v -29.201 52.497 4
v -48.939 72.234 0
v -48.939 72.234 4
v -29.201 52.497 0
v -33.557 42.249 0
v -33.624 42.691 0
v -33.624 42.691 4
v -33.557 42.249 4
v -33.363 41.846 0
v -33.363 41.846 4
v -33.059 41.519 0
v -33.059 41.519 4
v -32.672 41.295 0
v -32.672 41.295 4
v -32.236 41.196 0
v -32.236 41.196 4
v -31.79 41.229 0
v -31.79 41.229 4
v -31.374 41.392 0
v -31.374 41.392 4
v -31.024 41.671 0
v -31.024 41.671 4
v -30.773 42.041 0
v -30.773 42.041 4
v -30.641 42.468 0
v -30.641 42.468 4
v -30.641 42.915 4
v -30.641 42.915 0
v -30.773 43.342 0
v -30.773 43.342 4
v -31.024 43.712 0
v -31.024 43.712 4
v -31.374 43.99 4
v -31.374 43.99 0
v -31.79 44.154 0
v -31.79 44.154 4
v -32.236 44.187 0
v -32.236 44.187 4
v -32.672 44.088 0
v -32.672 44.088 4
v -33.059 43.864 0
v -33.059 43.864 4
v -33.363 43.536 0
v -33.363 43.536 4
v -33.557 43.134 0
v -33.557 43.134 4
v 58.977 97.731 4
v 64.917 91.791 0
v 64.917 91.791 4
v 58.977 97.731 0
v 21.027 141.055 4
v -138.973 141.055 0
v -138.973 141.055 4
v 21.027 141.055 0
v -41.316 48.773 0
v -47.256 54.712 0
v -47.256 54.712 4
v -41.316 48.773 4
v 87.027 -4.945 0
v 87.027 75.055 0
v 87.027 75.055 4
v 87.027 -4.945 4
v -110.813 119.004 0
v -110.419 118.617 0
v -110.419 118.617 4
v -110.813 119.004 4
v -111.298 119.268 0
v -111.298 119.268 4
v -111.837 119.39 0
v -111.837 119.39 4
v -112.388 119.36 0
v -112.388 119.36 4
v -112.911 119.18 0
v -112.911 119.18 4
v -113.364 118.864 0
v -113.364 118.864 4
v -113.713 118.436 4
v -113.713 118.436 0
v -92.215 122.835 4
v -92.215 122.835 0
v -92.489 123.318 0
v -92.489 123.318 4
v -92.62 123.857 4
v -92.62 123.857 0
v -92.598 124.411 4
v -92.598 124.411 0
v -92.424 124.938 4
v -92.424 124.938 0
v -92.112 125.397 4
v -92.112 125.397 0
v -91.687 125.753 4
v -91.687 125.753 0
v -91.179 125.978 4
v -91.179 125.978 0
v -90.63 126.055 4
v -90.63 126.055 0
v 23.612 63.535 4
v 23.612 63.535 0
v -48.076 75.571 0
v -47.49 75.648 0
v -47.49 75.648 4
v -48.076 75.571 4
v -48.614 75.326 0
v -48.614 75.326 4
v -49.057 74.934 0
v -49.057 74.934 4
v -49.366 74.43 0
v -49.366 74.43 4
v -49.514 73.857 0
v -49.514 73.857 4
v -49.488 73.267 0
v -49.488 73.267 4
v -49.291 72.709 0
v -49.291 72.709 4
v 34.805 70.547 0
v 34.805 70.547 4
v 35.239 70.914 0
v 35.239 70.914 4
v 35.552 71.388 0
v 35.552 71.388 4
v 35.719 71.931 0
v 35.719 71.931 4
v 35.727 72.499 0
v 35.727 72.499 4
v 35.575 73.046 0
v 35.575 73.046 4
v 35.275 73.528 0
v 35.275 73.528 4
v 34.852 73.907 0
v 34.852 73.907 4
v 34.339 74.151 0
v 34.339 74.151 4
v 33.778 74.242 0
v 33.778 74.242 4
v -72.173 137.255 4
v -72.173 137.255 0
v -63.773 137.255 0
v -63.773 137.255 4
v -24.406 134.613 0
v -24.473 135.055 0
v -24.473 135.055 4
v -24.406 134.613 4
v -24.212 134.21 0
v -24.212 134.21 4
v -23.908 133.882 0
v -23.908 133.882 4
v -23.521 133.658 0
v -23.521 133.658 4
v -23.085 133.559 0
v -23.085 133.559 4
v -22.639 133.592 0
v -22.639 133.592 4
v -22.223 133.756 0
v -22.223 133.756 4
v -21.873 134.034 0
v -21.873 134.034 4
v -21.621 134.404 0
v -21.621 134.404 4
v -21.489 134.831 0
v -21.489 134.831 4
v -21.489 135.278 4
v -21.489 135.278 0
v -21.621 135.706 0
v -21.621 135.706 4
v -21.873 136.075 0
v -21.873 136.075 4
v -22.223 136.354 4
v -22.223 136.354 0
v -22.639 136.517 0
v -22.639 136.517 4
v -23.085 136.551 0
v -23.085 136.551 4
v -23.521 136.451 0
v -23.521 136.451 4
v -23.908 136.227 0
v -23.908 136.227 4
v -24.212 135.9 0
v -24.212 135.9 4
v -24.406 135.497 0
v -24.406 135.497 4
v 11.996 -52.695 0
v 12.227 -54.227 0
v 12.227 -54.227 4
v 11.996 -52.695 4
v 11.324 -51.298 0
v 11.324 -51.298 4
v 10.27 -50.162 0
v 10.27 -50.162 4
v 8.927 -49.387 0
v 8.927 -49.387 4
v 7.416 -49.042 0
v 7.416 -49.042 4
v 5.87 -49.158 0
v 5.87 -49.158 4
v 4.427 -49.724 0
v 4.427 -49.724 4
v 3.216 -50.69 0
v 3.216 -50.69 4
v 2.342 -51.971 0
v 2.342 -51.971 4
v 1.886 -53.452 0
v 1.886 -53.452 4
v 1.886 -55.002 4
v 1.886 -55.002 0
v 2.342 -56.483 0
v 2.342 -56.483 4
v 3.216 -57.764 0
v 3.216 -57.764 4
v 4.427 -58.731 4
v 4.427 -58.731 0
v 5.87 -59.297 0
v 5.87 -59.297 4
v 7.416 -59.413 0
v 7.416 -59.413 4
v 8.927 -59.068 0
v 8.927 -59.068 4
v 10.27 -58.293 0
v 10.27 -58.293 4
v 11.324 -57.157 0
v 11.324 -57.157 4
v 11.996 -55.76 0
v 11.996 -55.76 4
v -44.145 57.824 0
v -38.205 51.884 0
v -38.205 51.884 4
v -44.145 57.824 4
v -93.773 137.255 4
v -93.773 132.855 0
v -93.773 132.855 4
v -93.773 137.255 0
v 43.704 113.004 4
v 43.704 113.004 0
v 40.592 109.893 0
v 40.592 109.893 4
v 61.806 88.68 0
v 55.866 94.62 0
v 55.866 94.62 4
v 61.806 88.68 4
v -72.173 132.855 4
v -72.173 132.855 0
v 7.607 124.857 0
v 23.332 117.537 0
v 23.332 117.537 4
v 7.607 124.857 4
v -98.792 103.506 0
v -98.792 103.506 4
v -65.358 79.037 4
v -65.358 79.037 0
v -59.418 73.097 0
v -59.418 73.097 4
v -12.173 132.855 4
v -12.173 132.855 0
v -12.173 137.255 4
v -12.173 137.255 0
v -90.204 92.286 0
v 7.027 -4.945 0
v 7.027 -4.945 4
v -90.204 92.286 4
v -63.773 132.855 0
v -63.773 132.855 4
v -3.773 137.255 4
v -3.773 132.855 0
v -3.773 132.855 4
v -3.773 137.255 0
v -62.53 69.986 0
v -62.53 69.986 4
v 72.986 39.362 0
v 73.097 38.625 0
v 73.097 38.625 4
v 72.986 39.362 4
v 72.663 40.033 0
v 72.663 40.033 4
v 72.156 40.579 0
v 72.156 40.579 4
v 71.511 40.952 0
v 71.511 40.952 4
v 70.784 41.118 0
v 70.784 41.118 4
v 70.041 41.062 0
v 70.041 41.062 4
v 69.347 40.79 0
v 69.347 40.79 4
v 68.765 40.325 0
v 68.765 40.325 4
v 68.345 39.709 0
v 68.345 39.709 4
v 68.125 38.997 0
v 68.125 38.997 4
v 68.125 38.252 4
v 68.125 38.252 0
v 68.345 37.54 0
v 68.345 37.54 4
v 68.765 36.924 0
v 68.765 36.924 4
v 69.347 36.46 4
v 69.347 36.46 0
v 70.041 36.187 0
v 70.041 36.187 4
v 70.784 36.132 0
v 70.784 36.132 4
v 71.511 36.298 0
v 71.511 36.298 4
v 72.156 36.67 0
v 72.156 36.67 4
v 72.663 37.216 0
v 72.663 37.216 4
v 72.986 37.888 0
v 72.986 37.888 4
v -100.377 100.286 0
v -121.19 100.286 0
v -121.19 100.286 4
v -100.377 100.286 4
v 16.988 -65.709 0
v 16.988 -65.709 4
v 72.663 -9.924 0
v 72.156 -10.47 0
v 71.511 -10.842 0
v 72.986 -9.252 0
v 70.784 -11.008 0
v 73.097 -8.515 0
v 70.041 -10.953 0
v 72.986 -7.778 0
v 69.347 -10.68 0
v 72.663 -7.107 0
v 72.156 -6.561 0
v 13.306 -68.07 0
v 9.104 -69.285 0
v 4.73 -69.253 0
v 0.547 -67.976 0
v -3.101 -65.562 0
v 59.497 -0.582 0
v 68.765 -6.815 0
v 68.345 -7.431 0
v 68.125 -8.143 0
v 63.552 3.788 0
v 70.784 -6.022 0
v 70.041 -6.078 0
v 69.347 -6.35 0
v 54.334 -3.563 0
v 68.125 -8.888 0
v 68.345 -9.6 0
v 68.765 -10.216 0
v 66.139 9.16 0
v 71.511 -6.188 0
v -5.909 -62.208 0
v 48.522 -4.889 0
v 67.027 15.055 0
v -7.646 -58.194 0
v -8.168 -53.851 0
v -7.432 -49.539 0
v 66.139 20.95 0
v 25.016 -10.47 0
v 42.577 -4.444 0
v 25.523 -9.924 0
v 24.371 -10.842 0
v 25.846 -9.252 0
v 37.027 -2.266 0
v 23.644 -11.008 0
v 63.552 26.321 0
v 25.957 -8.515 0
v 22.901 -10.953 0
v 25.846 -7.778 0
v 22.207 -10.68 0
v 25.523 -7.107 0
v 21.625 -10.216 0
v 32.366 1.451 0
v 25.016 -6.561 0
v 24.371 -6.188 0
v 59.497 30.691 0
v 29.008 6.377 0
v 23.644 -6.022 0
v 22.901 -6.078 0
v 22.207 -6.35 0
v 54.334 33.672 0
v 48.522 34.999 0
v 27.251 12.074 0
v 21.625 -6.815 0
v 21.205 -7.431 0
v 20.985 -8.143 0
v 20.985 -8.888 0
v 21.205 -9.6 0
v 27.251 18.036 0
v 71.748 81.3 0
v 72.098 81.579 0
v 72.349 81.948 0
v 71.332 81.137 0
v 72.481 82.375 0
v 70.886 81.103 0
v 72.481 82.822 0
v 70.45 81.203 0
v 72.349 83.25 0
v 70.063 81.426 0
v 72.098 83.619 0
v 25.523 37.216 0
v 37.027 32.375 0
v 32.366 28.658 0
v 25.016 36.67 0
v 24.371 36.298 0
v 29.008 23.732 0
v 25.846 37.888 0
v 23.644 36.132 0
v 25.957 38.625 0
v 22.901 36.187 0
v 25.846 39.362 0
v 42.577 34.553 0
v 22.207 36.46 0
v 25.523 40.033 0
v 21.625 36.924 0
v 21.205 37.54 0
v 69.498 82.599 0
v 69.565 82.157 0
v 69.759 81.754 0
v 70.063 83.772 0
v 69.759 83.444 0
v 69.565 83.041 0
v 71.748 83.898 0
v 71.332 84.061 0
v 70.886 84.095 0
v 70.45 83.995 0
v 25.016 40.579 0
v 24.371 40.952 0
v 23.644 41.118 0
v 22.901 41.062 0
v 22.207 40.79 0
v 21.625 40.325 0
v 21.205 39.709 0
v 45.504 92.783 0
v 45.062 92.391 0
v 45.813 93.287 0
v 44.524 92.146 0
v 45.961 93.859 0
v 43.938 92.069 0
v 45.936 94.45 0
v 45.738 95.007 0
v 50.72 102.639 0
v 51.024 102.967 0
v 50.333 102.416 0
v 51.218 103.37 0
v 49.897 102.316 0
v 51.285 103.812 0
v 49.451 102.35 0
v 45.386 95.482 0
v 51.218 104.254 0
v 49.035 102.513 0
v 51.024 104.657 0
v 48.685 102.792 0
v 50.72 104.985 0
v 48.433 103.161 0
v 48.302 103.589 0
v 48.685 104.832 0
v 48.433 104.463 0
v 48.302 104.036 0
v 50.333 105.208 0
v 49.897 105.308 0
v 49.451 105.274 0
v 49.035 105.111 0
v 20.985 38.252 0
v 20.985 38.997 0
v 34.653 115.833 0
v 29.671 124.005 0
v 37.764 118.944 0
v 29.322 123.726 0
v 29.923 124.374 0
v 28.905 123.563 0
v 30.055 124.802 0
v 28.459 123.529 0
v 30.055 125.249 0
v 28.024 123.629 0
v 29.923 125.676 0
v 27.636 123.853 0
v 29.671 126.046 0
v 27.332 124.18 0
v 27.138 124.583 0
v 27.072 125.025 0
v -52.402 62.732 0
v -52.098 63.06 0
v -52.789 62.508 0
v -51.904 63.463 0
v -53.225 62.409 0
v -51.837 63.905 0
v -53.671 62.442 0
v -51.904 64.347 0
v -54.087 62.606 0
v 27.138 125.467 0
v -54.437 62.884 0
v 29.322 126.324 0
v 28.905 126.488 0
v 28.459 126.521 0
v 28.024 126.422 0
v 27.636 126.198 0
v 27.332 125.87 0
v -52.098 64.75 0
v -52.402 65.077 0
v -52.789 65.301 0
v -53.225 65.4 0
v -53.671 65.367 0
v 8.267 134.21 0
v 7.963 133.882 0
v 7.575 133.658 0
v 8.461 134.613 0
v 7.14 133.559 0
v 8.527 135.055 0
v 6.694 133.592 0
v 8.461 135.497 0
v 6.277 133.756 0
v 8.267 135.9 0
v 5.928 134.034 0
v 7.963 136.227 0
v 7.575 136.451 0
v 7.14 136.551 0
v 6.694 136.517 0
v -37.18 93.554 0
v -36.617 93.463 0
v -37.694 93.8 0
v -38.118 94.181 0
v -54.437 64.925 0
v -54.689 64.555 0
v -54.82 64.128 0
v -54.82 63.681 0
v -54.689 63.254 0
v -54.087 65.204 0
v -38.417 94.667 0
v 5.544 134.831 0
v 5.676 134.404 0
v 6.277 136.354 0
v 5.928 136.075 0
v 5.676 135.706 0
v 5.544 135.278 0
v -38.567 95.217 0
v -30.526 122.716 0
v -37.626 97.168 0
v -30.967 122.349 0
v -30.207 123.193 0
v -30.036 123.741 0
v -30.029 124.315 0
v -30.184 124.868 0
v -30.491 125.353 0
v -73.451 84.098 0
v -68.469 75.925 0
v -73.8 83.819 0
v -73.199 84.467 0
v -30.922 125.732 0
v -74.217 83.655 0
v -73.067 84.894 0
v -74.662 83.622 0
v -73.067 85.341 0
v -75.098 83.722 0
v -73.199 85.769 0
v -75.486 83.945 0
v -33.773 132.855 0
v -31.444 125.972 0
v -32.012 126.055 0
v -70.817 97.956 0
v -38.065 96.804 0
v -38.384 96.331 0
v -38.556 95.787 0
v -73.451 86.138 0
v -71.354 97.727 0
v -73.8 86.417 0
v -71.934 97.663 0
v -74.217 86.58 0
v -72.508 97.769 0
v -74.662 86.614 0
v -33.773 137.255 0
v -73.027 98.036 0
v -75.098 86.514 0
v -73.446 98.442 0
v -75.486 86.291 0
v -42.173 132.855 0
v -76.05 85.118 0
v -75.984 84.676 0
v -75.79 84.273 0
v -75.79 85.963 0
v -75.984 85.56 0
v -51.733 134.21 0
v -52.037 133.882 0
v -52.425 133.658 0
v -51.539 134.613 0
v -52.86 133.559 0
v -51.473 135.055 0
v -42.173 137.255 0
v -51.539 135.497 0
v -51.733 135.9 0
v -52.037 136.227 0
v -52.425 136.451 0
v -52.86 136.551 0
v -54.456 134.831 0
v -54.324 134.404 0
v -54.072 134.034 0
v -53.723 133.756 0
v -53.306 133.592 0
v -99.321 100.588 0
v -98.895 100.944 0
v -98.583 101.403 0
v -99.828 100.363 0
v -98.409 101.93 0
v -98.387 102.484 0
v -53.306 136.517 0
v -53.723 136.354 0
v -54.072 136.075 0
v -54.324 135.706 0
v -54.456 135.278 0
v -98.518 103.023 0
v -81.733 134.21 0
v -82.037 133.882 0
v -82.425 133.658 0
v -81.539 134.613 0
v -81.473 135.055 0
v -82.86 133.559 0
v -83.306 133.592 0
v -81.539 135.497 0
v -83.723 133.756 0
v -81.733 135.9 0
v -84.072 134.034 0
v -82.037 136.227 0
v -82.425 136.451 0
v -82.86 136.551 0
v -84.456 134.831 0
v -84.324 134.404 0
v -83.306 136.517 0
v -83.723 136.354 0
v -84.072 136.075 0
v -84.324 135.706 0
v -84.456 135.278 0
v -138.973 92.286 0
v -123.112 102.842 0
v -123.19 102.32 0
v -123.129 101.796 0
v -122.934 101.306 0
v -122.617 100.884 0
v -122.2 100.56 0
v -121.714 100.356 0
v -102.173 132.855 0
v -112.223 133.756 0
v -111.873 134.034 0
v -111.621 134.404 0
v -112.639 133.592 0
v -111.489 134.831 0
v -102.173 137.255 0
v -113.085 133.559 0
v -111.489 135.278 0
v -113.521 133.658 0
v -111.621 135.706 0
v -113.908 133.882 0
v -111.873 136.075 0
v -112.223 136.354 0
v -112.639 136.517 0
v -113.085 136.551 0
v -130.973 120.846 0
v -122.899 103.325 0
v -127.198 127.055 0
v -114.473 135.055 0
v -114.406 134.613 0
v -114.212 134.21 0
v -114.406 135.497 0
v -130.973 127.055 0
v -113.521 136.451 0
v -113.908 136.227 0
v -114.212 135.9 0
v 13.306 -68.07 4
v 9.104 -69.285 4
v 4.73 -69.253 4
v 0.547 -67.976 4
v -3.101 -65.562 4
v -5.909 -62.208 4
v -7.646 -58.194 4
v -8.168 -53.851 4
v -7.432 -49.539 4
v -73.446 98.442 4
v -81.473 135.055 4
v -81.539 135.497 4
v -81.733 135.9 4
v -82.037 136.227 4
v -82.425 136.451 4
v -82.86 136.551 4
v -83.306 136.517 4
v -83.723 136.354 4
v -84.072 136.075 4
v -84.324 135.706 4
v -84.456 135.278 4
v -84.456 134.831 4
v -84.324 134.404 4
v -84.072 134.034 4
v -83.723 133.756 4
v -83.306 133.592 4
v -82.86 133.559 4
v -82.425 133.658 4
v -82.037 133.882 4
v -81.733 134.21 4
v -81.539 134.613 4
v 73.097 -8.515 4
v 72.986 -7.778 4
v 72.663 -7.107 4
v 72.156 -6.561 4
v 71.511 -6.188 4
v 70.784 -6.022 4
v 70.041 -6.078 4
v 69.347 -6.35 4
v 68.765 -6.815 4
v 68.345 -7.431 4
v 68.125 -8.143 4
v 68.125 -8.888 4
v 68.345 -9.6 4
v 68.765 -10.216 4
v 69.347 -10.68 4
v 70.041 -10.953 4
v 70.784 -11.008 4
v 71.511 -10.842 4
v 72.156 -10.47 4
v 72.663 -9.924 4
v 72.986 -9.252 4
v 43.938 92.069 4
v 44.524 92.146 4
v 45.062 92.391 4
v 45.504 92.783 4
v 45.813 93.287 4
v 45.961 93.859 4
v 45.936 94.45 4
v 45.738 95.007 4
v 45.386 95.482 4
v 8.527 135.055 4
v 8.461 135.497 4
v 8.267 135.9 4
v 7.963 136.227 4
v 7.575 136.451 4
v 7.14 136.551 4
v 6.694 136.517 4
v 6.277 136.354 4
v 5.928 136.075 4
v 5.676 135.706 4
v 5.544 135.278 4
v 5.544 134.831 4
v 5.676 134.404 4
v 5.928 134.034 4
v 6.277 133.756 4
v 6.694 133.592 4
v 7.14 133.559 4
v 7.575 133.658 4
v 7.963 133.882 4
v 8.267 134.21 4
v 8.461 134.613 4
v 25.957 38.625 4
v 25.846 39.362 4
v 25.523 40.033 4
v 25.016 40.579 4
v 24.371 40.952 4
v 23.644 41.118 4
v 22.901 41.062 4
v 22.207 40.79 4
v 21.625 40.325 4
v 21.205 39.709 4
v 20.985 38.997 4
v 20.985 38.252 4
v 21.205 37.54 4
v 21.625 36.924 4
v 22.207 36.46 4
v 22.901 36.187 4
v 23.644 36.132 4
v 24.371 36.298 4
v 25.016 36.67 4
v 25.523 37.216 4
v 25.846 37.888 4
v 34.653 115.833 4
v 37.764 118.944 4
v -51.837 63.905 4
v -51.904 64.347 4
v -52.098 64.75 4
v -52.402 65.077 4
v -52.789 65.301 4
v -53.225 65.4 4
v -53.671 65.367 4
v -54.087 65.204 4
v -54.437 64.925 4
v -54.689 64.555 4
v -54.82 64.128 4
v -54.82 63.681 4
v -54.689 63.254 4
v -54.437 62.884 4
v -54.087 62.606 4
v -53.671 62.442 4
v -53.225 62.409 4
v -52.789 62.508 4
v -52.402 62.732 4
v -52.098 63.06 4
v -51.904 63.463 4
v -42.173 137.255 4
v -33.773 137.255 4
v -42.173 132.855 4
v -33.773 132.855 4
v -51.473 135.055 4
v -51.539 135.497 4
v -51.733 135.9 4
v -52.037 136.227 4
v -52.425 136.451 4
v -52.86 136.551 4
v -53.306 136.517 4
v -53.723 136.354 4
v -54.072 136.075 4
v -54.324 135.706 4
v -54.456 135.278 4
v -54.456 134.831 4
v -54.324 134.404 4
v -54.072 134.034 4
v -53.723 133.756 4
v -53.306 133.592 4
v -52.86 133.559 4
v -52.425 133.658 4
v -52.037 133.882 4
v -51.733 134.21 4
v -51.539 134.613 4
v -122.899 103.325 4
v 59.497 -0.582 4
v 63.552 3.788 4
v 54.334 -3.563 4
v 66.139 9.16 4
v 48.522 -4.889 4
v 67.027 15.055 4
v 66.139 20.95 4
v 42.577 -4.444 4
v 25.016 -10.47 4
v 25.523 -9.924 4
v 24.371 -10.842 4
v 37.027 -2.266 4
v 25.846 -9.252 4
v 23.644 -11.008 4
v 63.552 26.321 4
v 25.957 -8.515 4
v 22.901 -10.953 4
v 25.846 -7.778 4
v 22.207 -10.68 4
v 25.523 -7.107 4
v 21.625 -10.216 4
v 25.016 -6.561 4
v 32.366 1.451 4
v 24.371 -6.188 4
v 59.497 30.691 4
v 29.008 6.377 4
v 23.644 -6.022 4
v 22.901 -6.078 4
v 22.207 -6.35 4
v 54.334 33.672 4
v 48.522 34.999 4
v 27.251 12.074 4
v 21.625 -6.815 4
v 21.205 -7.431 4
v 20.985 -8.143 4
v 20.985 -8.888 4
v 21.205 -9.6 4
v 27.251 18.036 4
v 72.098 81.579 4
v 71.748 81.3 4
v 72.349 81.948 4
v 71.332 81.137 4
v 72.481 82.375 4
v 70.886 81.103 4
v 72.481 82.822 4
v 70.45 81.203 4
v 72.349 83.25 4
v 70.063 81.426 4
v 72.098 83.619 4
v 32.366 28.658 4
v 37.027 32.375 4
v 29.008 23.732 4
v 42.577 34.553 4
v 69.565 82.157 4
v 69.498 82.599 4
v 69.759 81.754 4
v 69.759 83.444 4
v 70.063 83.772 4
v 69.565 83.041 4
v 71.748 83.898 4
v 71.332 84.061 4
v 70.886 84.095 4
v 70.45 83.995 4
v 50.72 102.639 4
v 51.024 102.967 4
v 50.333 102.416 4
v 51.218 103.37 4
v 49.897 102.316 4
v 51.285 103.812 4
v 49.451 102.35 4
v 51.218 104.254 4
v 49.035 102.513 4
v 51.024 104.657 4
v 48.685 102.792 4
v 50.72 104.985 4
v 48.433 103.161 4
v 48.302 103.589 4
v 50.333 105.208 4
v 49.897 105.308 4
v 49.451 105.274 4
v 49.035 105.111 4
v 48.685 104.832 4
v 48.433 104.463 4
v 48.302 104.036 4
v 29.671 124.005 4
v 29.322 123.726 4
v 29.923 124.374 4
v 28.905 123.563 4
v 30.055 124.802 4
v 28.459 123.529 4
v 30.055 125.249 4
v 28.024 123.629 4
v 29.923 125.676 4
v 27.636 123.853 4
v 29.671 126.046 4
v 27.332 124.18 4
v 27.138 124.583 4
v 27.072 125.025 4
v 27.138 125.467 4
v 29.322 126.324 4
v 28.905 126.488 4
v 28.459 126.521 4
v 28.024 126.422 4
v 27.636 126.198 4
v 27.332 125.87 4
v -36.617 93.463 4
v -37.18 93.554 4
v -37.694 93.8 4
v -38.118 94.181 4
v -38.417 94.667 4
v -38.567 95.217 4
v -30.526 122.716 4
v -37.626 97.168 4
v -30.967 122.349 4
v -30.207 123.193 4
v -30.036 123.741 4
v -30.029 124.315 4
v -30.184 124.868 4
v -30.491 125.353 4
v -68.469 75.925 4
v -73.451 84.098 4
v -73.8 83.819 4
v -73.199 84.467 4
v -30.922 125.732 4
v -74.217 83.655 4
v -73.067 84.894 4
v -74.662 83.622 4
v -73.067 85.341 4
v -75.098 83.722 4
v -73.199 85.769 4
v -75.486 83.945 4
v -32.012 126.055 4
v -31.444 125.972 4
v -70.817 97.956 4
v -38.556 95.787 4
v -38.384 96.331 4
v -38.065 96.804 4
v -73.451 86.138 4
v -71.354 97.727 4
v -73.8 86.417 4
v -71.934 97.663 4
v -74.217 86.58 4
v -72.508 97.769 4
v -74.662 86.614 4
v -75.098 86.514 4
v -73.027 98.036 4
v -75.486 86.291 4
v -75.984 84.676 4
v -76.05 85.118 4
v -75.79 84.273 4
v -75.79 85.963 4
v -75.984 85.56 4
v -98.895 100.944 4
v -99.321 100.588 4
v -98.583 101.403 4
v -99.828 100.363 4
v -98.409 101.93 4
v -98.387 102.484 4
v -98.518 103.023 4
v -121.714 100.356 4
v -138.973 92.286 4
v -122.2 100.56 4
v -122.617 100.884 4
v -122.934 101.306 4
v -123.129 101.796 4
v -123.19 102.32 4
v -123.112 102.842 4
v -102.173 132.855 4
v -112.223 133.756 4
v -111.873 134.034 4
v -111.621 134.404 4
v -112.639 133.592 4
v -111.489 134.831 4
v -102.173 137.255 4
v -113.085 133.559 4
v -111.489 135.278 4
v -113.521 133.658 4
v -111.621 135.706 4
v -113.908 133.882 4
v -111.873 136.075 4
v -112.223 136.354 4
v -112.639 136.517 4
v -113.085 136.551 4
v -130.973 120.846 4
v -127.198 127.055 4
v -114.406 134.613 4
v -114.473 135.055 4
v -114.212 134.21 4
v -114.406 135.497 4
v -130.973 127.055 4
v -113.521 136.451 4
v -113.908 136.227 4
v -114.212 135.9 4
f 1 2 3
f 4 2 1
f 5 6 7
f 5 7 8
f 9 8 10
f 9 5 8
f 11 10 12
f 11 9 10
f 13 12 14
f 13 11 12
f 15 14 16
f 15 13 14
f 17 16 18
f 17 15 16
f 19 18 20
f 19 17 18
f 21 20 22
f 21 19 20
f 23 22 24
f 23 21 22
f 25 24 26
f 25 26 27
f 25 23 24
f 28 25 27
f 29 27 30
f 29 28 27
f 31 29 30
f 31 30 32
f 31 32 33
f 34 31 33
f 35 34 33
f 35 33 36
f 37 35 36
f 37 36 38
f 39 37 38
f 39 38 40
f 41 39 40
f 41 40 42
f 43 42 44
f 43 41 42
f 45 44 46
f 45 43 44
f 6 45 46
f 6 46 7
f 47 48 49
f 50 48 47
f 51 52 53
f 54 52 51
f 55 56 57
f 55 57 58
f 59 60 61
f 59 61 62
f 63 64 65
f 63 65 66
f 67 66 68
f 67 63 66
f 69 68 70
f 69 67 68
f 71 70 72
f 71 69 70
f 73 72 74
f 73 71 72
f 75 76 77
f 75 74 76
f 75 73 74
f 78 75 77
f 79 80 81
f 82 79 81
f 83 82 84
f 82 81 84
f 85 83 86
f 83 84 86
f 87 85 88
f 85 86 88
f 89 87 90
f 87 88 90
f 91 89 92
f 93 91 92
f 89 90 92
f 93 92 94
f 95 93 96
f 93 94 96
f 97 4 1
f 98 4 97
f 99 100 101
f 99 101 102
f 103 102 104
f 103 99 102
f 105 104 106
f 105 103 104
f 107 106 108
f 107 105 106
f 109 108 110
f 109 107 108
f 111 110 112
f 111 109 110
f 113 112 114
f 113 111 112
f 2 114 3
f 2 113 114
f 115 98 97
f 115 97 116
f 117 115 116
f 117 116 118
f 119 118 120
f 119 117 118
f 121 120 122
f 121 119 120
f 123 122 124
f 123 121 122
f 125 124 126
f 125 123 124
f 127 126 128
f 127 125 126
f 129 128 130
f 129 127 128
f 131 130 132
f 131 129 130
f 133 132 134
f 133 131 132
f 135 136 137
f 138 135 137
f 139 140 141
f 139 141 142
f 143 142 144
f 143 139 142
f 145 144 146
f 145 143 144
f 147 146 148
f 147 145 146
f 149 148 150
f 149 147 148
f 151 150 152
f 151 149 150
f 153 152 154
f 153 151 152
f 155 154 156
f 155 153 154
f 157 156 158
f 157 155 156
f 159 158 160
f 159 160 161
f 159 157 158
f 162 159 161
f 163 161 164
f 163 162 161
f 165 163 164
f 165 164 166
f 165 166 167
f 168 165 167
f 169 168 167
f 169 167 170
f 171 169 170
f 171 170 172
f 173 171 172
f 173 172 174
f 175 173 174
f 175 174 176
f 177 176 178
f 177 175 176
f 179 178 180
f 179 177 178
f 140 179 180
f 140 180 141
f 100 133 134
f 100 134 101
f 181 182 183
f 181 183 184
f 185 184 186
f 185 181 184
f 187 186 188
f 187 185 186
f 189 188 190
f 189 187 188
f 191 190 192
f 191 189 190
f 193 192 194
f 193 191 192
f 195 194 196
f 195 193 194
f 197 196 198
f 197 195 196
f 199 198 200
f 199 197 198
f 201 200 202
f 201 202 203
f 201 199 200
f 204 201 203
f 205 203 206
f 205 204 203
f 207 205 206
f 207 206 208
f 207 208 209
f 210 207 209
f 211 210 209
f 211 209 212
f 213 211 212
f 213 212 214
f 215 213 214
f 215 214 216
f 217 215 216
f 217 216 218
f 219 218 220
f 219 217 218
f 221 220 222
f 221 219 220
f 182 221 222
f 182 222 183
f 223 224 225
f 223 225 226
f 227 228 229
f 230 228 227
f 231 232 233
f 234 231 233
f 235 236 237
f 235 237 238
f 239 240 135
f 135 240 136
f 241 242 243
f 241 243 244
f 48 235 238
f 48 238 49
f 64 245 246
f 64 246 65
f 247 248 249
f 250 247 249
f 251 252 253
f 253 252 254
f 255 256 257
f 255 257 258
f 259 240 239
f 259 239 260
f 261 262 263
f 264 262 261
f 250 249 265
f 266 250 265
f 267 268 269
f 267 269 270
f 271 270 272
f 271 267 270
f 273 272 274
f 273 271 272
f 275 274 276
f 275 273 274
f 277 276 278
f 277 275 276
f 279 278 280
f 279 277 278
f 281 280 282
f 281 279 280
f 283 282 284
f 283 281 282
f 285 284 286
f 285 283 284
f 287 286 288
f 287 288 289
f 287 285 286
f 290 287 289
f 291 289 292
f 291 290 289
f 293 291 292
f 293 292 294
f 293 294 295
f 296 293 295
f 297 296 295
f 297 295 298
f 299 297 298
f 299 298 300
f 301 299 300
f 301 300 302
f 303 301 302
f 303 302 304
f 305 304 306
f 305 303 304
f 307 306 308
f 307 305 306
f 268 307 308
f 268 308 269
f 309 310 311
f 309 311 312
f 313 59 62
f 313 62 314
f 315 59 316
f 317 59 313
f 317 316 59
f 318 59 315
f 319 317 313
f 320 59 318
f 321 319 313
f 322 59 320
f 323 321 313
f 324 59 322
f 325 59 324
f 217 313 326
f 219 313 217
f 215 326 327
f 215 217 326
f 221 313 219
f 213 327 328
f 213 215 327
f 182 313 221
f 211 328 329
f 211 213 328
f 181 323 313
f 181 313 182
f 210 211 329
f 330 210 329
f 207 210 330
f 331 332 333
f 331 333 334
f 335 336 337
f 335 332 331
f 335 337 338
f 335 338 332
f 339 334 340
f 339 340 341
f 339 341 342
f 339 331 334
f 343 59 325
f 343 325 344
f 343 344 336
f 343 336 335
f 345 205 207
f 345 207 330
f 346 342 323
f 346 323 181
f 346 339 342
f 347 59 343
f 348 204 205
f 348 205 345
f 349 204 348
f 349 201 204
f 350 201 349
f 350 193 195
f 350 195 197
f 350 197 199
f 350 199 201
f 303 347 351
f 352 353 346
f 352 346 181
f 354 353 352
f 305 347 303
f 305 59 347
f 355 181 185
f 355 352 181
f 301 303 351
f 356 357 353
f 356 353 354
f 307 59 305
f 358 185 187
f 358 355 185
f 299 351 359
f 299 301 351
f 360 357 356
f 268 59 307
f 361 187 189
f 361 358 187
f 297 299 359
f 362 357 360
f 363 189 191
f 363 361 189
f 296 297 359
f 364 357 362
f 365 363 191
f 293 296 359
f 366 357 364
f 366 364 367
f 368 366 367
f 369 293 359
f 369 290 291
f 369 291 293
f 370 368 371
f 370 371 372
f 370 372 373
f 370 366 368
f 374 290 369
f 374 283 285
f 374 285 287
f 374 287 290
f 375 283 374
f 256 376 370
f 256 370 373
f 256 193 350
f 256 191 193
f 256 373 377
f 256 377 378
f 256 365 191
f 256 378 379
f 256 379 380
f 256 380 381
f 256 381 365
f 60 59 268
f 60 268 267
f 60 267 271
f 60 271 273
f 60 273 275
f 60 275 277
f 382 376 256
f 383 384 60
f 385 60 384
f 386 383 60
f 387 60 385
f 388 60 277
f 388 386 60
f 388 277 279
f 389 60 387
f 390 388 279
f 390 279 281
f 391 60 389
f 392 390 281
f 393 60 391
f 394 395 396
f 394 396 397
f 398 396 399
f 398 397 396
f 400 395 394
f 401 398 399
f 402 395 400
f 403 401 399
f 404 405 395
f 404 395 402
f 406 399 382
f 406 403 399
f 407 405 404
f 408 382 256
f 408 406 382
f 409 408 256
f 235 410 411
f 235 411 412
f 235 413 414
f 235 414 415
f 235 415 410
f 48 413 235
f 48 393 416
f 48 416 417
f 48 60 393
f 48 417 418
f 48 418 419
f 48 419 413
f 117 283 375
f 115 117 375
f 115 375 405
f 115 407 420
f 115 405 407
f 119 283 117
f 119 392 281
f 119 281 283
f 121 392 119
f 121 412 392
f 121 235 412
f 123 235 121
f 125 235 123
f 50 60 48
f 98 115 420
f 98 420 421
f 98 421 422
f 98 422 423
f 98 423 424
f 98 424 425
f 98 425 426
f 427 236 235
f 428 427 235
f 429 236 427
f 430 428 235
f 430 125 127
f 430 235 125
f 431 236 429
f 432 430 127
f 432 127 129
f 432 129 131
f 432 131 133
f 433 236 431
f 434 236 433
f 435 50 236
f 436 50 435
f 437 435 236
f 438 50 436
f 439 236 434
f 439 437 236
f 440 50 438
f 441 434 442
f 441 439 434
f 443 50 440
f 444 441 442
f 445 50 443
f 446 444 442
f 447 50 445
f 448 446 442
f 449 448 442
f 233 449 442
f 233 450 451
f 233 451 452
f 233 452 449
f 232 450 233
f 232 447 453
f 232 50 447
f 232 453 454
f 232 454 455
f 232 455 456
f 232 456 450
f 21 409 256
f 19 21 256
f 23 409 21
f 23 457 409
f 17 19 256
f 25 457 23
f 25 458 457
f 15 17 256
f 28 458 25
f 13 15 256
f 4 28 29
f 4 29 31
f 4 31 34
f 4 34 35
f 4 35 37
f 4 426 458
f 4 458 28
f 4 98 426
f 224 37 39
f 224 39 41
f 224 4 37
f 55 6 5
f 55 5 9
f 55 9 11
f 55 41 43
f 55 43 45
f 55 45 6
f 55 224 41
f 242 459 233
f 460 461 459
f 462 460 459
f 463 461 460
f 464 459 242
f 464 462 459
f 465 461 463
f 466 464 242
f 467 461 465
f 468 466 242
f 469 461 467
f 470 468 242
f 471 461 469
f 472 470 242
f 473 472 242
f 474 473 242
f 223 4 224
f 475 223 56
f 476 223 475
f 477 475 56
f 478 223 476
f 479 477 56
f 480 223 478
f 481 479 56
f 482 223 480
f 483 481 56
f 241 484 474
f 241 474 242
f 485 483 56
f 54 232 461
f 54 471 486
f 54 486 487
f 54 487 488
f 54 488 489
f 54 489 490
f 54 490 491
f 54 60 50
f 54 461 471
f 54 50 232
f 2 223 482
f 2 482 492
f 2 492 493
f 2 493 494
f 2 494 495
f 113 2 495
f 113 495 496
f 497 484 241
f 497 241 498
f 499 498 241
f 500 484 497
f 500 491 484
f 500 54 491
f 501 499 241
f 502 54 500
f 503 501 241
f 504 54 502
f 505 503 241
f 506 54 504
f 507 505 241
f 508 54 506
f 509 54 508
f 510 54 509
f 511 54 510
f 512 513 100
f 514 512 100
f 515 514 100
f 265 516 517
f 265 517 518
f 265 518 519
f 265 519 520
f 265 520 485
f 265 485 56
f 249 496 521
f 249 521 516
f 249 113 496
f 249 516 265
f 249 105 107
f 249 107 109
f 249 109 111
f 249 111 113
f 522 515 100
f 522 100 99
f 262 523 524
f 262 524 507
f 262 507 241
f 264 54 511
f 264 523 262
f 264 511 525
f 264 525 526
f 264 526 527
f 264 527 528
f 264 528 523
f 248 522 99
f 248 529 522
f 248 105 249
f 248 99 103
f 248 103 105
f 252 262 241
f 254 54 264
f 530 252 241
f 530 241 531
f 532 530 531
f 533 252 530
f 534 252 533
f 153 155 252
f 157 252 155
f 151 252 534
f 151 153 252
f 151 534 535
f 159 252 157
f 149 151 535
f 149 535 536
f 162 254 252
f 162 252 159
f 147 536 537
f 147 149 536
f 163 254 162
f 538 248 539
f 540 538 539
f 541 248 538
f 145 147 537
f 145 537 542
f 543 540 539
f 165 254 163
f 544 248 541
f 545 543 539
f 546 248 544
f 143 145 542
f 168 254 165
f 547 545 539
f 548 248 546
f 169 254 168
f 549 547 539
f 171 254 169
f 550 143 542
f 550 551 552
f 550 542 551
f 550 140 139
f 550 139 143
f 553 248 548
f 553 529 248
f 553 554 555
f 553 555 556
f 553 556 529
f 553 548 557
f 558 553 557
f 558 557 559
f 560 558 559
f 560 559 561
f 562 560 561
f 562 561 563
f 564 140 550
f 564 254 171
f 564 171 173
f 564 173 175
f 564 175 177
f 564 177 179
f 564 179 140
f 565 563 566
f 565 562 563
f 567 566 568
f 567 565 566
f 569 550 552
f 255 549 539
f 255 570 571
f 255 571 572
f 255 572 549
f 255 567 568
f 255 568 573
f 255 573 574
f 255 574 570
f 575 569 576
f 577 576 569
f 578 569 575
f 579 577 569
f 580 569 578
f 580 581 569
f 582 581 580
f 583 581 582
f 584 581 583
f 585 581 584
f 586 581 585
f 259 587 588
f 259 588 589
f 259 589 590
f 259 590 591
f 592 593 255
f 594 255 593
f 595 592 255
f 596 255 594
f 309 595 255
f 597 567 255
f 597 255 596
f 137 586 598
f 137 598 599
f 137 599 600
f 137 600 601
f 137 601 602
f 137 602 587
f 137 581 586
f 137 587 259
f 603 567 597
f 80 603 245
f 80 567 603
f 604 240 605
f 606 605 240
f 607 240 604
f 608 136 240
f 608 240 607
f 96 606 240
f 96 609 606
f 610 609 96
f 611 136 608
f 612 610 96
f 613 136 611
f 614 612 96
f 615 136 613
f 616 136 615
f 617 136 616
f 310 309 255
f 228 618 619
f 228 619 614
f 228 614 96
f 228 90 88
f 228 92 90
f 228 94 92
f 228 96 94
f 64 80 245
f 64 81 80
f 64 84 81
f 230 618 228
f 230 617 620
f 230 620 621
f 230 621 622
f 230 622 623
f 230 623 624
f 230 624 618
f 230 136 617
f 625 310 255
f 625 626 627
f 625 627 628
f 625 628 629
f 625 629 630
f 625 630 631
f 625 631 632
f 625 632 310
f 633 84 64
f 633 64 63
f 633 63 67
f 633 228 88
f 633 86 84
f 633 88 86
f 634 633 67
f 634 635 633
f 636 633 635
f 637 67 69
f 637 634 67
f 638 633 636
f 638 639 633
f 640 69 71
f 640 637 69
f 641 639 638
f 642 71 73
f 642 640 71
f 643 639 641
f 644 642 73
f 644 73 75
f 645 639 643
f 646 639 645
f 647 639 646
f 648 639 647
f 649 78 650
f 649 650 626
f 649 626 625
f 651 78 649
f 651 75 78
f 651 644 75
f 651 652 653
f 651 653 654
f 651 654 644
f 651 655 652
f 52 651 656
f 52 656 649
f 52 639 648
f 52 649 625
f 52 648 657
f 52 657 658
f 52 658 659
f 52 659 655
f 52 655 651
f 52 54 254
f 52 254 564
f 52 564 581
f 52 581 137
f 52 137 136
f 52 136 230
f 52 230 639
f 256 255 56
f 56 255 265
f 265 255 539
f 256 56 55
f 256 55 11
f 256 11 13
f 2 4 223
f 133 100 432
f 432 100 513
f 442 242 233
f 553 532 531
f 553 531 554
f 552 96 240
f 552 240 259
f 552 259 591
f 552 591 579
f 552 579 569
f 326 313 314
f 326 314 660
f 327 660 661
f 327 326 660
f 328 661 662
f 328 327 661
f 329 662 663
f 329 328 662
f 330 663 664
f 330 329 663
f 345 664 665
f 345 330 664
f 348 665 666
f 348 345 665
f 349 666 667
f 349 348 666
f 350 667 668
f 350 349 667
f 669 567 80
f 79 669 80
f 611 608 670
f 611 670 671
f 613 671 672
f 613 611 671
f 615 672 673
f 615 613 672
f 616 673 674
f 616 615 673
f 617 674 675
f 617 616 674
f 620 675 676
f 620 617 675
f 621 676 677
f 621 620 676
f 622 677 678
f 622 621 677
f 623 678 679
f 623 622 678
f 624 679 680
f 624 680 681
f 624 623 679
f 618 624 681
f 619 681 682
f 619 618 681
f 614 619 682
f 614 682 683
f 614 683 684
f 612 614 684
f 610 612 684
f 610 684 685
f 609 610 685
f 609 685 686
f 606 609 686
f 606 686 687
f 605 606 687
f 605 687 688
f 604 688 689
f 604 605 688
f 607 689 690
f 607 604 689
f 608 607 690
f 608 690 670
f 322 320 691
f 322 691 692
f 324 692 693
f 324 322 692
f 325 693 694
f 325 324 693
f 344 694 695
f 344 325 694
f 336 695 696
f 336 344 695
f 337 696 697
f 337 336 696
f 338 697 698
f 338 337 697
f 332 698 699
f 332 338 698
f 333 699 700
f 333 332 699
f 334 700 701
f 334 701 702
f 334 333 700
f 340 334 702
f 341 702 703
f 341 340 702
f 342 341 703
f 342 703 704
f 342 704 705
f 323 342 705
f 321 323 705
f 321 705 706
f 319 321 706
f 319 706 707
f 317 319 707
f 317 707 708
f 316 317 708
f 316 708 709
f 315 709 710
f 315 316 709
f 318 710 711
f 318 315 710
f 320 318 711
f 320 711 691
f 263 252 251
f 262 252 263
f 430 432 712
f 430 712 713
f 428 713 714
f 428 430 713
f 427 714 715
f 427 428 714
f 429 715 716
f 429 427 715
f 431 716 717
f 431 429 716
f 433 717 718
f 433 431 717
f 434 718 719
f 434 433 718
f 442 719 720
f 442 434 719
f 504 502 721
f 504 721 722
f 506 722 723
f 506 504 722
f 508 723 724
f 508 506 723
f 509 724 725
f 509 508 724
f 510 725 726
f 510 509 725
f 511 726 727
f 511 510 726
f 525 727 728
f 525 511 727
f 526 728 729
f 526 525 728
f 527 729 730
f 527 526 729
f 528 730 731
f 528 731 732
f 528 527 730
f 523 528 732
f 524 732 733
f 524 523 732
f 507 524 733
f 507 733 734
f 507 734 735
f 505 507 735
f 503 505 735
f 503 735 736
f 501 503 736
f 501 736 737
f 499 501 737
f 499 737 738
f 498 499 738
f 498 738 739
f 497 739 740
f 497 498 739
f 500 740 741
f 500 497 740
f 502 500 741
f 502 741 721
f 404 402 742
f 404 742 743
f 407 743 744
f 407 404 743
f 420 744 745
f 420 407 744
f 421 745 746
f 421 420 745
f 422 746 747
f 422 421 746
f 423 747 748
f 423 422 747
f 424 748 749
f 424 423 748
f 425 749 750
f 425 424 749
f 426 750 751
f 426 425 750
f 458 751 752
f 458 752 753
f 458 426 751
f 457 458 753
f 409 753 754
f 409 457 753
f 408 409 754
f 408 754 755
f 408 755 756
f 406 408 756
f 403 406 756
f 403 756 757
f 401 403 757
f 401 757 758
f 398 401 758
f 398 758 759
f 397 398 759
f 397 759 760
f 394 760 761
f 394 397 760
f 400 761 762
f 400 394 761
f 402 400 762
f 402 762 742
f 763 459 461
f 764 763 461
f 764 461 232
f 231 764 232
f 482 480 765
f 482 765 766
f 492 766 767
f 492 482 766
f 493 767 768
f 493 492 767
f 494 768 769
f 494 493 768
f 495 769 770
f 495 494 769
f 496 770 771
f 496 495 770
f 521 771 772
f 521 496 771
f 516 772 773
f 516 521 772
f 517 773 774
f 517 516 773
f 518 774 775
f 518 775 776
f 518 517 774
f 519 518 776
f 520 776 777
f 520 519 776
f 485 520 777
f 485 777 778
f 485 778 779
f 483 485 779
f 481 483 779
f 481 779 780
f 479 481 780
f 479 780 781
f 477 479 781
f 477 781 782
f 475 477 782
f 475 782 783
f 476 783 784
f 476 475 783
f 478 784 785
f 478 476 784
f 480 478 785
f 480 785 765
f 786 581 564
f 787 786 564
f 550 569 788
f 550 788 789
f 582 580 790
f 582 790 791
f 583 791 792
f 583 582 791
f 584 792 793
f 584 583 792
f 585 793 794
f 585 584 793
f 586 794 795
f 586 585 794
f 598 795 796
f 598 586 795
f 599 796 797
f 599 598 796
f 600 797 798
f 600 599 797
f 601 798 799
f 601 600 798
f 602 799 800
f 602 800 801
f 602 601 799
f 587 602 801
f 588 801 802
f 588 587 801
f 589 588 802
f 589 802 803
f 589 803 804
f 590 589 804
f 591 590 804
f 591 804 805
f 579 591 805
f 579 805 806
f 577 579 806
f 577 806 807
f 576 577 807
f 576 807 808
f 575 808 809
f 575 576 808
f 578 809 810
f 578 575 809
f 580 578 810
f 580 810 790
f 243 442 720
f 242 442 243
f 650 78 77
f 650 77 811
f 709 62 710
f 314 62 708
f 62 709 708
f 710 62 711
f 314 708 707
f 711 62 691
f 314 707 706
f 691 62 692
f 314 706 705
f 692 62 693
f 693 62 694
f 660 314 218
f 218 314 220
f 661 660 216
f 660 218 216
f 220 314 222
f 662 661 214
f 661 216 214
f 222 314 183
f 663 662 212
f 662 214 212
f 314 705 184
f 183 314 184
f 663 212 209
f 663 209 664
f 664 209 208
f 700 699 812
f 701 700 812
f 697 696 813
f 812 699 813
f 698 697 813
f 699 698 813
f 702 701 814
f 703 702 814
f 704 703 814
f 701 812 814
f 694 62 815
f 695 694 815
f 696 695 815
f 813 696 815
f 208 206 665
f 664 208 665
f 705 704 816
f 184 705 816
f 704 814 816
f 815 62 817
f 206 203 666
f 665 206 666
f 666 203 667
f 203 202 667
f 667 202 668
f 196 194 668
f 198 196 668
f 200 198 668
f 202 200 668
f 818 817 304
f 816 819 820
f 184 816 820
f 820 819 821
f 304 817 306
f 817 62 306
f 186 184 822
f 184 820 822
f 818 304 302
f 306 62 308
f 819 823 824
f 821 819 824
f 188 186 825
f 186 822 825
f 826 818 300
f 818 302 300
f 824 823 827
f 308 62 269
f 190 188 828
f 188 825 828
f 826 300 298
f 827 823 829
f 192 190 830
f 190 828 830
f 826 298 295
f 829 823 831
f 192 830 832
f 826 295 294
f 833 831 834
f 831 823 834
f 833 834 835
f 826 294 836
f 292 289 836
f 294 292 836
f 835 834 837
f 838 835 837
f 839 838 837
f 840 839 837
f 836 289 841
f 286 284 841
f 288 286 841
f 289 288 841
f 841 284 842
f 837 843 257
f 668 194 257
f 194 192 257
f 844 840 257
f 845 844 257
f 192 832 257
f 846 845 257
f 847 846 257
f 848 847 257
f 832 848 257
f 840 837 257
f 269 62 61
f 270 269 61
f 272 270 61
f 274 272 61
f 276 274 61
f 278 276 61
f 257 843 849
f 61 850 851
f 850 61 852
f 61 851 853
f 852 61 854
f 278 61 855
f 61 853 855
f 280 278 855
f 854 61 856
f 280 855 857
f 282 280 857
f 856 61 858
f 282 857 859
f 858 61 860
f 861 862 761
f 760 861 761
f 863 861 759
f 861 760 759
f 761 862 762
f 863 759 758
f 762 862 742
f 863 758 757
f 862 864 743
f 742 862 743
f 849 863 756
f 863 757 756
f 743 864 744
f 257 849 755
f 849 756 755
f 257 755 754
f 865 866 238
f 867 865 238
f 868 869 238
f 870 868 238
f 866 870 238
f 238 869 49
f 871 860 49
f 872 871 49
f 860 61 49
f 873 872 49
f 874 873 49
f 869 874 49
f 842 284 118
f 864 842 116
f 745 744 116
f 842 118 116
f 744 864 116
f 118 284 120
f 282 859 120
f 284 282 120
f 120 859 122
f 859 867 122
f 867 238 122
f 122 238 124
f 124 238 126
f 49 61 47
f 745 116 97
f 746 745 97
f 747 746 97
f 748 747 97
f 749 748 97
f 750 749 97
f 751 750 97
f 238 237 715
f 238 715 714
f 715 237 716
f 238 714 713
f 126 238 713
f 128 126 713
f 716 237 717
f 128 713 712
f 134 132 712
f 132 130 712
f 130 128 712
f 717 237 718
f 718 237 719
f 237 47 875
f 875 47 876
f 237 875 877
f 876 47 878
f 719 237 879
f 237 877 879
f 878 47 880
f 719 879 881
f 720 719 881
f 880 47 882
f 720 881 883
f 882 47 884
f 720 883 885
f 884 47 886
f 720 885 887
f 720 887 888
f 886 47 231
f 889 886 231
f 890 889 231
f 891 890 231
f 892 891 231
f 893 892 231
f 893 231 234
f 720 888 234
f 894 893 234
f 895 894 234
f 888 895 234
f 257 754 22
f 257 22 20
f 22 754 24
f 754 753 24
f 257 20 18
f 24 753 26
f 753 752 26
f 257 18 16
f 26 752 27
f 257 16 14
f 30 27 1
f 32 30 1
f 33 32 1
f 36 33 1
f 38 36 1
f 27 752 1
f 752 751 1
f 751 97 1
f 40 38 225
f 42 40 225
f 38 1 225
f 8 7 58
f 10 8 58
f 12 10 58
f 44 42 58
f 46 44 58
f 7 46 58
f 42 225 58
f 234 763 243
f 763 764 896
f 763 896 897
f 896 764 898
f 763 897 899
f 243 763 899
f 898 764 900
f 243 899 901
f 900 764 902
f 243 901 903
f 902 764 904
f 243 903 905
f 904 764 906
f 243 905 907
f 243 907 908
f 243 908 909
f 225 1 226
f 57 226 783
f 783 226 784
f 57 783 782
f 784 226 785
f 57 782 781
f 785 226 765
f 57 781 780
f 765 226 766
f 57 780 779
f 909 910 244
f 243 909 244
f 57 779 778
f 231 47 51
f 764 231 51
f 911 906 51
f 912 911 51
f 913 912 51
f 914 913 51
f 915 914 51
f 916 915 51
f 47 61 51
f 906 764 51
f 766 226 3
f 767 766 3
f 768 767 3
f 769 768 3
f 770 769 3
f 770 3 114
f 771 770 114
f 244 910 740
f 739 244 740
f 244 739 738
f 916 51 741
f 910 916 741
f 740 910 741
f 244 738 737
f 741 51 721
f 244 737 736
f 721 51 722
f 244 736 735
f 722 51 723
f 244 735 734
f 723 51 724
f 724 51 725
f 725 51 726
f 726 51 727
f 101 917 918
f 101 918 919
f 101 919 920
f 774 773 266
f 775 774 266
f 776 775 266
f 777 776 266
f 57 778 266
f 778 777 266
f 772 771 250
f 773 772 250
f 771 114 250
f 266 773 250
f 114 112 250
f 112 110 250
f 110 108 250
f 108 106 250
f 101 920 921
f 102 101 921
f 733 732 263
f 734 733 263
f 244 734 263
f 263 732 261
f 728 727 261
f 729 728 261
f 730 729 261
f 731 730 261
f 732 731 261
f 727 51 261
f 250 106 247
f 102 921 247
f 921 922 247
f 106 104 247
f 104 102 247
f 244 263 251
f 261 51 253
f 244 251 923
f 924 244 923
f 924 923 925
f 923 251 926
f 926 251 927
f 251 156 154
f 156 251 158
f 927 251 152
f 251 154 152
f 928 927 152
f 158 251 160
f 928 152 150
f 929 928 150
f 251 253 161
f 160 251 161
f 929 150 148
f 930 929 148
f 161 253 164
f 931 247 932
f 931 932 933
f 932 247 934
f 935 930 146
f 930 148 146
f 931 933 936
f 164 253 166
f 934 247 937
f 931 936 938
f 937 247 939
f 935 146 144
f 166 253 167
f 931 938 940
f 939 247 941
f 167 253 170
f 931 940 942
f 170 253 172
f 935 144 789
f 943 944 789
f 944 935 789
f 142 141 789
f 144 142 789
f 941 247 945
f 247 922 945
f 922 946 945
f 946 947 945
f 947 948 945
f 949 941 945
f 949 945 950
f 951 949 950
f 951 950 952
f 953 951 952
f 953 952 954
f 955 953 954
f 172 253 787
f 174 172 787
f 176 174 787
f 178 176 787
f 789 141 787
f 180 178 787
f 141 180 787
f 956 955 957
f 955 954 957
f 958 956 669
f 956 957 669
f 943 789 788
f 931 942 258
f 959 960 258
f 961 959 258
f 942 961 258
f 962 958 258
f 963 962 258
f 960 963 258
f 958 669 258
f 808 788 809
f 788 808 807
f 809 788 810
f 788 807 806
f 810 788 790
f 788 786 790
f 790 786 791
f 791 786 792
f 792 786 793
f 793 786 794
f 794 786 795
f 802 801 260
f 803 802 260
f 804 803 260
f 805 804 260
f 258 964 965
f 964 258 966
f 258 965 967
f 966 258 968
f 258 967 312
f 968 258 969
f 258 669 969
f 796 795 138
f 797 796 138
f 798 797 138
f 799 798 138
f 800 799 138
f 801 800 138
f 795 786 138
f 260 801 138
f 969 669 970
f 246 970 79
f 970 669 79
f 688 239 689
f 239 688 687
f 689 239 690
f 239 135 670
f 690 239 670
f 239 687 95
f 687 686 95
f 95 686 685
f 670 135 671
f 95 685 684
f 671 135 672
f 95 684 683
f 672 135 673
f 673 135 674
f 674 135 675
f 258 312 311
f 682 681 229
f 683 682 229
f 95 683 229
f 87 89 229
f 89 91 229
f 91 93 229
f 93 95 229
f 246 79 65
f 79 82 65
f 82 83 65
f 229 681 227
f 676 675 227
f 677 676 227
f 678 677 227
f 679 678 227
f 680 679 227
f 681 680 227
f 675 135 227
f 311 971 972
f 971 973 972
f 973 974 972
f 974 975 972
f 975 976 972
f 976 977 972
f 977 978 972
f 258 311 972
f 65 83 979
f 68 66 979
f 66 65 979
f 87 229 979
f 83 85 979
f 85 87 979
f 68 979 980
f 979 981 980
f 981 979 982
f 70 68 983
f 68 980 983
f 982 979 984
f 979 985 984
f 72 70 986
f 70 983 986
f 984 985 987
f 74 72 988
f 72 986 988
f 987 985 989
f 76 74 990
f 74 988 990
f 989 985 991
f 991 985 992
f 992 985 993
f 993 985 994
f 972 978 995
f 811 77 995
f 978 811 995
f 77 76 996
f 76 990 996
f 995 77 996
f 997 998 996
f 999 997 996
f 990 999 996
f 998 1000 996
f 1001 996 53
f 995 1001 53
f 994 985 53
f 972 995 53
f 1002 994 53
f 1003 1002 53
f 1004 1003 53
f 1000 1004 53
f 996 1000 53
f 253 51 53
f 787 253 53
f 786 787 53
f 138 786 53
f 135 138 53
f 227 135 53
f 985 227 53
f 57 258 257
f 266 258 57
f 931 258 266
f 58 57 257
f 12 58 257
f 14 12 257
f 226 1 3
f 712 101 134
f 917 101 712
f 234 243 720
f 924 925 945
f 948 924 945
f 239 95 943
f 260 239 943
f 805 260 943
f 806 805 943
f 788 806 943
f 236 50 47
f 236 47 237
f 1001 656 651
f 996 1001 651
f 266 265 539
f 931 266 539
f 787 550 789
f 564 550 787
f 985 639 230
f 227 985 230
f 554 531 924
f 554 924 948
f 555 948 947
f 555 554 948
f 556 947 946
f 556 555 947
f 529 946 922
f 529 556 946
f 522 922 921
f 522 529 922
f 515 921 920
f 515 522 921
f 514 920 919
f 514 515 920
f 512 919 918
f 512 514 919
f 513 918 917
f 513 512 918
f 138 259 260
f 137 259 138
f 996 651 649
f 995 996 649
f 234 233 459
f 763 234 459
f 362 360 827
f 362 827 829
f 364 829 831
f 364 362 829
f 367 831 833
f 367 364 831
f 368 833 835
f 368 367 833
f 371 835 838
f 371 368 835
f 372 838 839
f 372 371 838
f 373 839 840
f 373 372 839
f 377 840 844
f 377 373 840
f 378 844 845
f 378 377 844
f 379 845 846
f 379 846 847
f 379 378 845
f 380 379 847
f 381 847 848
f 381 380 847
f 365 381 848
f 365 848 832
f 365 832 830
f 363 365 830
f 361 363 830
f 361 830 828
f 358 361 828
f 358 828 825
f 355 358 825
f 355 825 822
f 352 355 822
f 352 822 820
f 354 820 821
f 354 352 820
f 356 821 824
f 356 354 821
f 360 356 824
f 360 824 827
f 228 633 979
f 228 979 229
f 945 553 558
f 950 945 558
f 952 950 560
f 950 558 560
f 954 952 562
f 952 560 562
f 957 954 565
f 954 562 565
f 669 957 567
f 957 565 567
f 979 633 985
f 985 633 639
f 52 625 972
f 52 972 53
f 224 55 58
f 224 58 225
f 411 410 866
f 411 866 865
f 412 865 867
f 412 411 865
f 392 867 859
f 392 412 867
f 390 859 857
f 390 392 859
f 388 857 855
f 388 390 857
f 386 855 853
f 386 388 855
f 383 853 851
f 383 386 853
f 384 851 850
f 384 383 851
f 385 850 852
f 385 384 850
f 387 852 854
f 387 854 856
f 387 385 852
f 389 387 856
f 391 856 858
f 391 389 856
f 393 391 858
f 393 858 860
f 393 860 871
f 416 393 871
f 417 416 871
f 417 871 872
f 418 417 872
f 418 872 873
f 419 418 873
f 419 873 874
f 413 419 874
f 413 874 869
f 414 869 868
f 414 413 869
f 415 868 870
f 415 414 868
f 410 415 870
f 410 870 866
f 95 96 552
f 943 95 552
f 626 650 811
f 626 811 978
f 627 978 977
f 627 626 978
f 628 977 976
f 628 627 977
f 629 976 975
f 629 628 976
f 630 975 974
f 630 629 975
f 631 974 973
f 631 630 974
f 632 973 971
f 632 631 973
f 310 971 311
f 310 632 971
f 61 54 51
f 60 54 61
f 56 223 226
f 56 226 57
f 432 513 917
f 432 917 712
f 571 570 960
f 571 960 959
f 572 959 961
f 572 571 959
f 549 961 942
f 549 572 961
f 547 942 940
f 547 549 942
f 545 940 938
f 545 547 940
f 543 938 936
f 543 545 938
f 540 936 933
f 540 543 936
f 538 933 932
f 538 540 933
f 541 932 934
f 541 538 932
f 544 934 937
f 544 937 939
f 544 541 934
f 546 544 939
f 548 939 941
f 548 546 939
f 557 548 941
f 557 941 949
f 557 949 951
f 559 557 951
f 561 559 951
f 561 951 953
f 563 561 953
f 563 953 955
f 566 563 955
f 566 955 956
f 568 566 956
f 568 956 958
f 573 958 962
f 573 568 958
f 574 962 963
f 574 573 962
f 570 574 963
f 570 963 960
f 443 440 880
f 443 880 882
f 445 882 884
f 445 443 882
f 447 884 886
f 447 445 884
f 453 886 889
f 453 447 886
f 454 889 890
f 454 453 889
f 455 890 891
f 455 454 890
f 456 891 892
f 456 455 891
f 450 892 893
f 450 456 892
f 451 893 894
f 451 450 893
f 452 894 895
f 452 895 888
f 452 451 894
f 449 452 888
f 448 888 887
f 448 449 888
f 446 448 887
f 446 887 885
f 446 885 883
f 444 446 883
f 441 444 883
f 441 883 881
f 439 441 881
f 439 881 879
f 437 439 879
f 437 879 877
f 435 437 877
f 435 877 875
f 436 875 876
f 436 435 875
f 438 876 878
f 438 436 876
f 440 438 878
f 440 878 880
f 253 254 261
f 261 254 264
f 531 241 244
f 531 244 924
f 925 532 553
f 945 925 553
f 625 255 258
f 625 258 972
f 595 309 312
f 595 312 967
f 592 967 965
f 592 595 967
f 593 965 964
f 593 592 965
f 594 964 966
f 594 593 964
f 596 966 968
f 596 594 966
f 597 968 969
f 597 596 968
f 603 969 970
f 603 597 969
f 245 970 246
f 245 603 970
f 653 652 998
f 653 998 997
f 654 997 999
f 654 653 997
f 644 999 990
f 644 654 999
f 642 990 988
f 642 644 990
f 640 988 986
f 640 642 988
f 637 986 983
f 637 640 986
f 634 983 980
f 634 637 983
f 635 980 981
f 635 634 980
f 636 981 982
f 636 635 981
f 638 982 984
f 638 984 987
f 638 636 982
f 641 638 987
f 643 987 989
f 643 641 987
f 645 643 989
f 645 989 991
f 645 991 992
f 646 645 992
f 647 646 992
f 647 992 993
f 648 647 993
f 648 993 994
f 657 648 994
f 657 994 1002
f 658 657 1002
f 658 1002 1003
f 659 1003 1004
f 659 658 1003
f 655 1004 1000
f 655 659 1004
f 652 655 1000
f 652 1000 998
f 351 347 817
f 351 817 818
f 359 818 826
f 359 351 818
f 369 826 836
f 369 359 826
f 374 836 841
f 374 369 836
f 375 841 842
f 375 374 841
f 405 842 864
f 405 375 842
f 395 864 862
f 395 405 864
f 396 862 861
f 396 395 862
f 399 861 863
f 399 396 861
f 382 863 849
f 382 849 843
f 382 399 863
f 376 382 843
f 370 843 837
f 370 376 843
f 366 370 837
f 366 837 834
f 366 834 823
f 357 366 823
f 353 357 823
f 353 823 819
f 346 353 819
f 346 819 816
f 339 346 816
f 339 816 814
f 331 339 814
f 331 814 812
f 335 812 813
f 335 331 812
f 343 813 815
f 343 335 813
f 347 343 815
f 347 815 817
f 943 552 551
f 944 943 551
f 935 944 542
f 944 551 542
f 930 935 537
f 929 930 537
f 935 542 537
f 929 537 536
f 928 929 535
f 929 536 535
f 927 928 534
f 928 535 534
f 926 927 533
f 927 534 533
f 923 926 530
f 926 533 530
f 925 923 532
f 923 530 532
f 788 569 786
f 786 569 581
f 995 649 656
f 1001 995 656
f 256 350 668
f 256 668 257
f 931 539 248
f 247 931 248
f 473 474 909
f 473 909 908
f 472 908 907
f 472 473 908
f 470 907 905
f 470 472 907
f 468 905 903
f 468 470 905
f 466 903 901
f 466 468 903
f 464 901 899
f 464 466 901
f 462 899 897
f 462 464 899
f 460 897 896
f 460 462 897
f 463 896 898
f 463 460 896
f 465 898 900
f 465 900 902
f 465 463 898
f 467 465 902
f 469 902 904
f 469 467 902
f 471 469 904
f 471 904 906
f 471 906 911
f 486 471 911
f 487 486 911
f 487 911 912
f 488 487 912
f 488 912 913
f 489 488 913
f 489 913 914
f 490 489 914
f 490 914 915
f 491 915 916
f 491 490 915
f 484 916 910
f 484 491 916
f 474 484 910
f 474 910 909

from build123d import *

# Parameters (mm, degrees)
SKETCH_1_R          = 1.5
SKETCH_1_R_2        = 20
SKETCH_1_R_3        = 5.2
SKETCH_1_R_4        = 2.5
SKETCH_1_W          = 8.4
SKETCH_1_H          = 4.4
EXTRUDE_1_DEPTH     = 4
CUT_EXTRUDE_1_DEPTH = 10


with BuildPart() as part:
    # 草图1 → 凸台-拉伸1 (new body)
    with BuildSketch(Plane.XY):
        with BuildLine():
            Line((-138.972571837, 141.054738201), (21.027428163, 141.054738201))
            Line((21.027428163, 141.054738201), (87.027428163, 75.054738201))
            Line((87.027428163, 75.054738201), (87.027428163, -4.945261799))
            Line((87.027428163, -4.945261799), (16.988248923, -65.708672494))
            ThreePointArc((16.988248923, -65.708672494), (-1.364322077, -66.900830621), (-7.431532599, -49.539175751))
            Line((-7.431532599, -49.539175751), (7.027428163, -4.945261799))
            Line((7.027428163, -4.945261799), (-90.203942848, 92.286109212))
            Line((-90.203942848, 92.286109212), (-138.972571837, 92.286109212))
            Line((-138.972571837, 92.286109212), (-138.972571837, 141.054738201))
        make_face()
        with Locations((-52.972571837, 135.054738201)):
            Circle(SKETCH_1_R, mode=Mode.SUBTRACT)
        with Locations((47.027428163, 15.054738201)):
            Circle(SKETCH_1_R_2, mode=Mode.SUBTRACT)
        with Locations(Location((-22.972571837, 135.054738201, 0), (0, 0, 180))):
            Circle(SKETCH_1_R, mode=Mode.SUBTRACT)
        with Locations((7.027428163, 135.054738201)):
            Circle(SKETCH_1_R, mode=Mode.SUBTRACT)
        with Locations(Location((-112.972571837, 135.054738201, 0), (0, 0, 180))):
            Circle(SKETCH_1_R, mode=Mode.SUBTRACT)
        with Locations((-82.972571837, 135.054738201)):
            Circle(SKETCH_1_R, mode=Mode.SUBTRACT)
        with Locations((7.027428163, -54.227294102)):
            Circle(SKETCH_1_R_3, mode=Mode.SUBTRACT)
        with Locations((49.784787476, 103.812097514)):
            Circle(SKETCH_1_R, mode=Mode.SUBTRACT)
        with Locations(Location((70.997990912, 82.598894078, 0), (0, 0, 180))):
            Circle(SKETCH_1_R, mode=Mode.SUBTRACT)
        with Locations(Location((28.571584041, 125.025300949, 0), (0, 0, 180))):
            Circle(SKETCH_1_R, mode=Mode.SUBTRACT)
        with Locations((-53.337194475, 63.904642213)):
            Circle(SKETCH_1_R, mode=Mode.SUBTRACT)
        with Locations(Location((-32.123991039, 42.691438778, 0), (0, 0, 180))):
            Circle(SKETCH_1_R, mode=Mode.SUBTRACT)
        with Locations(Location((-74.55039791, 85.117845649, 0), (0, 0, 180))):
            Circle(SKETCH_1_R, mode=Mode.SUBTRACT)
        with Locations((70.597428163, 38.624738201)):
            Circle(SKETCH_1_R_4, mode=Mode.SUBTRACT)
        with Locations((70.597428163, -8.515261799)):
            Circle(SKETCH_1_R_4, mode=Mode.SUBTRACT)
        with Locations((23.457428163, -8.515261799)):
            Circle(SKETCH_1_R_4, mode=Mode.SUBTRACT)
        with Locations((23.457428163, 38.624738201)):
            Circle(SKETCH_1_R_4, mode=Mode.SUBTRACT)
        with Locations((-37.972571837, 135.054738201)):
            Rectangle(SKETCH_1_W, SKETCH_1_H, mode=Mode.SUBTRACT)
        with Locations((-7.972571837, 135.054738201)):
            Rectangle(SKETCH_1_W, SKETCH_1_H, mode=Mode.SUBTRACT)
        with Locations((-97.972571837, 135.054738201)):
            Rectangle(SKETCH_1_W, SKETCH_1_H, mode=Mode.SUBTRACT)
        with Locations((-67.972571837, 135.054738201)):
            Rectangle(SKETCH_1_W, SKETCH_1_H, mode=Mode.SUBTRACT)
        Polygon((55.865905794, 94.619709358), (61.805602756, 88.680012396), (64.916872594, 91.791282234), (58.977175632, 97.730979196), align=None, mode=Mode.SUBTRACT)
        Polygon((34.652702359, 115.832912794), (37.763972196, 118.944182631), (43.703669158, 113.004485669), (40.592399321, 109.893215832), align=None, mode=Mode.SUBTRACT)
        Polygon((-47.256076157, 54.712254058), (-41.316379195, 48.772557096), (-38.205109357, 51.883826933), (-44.144806319, 57.823523895), align=None, mode=Mode.SUBTRACT)
        Polygon((-68.469279592, 75.925457494), (-65.358009755, 79.036727331), (-59.418312793, 73.097030369), (-62.52958263, 69.985760532), align=None, mode=Mode.SUBTRACT)
    extrude(amount=EXTRUDE_1_DEPTH)

    # 草图2 → 切除-拉伸1 (cut)
    with BuildSketch(Plane(origin=(0, 0, 0), x_dir=(-1, 0, 0), z_dir=(0, 0, -1))):
        with BuildLine():
            Line((98.792246858, 103.505713788), (110.418981679, 118.616857906))
            ThreePointArc((110.418981679, 118.616857906), (112.113620797, 119.394251765), (113.713072721, 118.436182616))
            Line((113.713072721, 118.436182616), (122.899473042, 103.325038498))
            ThreePointArc((122.899473042, 103.325038498), (122.933741653, 101.305767071), (121.190489151, 100.286109212))
            Line((121.190489151, 100.286109212), (100.377354008, 100.286109212))
            ThreePointArc((100.377354008, 100.286109212), (98.583028348, 101.402709289), (98.792246858, 103.505713788))
        make_face()
        Polygon((127.198237985, 127.054738201), (130.972571837, 120.84615804), (130.972571837, 127.054738201), align=None)
        with BuildLine():
            Line((73.446278945, 98.44171591), (92.214930542, 122.835133626))
            ThreePointArc((92.214930542, 122.835133626), (92.424149051, 124.938138124), (90.629823391, 126.054738201))
            Line((90.629823391, 126.054738201), (32.011635988, 126.054738201))
            ThreePointArc((32.011635988, 126.054738201), (30.086594754, 124.59715524), (30.967460822, 122.348954445))
            Line((30.967460822, 122.348954445), (70.816996628, 97.955536729))
            ThreePointArc((70.816996628, 97.955536729), (72.224826028, 97.694659457), (73.446278945, 98.44171591))
        make_face()
        with BuildLine():
            Line((36.616706696, 93.462689168), (-43.937662379, 92.068564807))
            ThreePointArc((-43.937662379, 92.068564807), (-45.813338133, 93.286939697), (-45.386484011, 95.482478917))
            Line((-45.386484011, 95.482478917), (-23.33185922, 117.537103709))
            Line((-23.33185922, 117.537103709), (-7.607283327, 124.857355573))
            Line((-7.607283327, 124.857355573), (37.626273792, 97.168173472))
            ThreePointArc((37.626273792, 97.168173472), (38.51176098, 94.936649095), (36.616706696, 93.462689168))
        make_face()
        with BuildLine():
            Line((29.20140553, 52.49677533), (-23.612246698, 63.53541151))
            Line((-23.612246698, 63.53541151), (-34.805439363, 70.547080779))
            ThreePointArc((-34.805439363, 70.547080779), (-35.670630649, 72.777688158), (-33.778316178, 74.241693343))
            Line((-33.778316178, 74.241693343), (47.490069377, 75.64817492))
            ThreePointArc((47.490069377, 75.64817492), (49.365745131, 74.42980003), (48.93889101, 72.23426081))
            Line((48.93889101, 72.23426081), (29.20140553, 52.49677533))
        make_face()
    extrude(amount=-CUT_EXTRUDE_1_DEPTH, mode=Mode.SUBTRACT)


solid = part.part
